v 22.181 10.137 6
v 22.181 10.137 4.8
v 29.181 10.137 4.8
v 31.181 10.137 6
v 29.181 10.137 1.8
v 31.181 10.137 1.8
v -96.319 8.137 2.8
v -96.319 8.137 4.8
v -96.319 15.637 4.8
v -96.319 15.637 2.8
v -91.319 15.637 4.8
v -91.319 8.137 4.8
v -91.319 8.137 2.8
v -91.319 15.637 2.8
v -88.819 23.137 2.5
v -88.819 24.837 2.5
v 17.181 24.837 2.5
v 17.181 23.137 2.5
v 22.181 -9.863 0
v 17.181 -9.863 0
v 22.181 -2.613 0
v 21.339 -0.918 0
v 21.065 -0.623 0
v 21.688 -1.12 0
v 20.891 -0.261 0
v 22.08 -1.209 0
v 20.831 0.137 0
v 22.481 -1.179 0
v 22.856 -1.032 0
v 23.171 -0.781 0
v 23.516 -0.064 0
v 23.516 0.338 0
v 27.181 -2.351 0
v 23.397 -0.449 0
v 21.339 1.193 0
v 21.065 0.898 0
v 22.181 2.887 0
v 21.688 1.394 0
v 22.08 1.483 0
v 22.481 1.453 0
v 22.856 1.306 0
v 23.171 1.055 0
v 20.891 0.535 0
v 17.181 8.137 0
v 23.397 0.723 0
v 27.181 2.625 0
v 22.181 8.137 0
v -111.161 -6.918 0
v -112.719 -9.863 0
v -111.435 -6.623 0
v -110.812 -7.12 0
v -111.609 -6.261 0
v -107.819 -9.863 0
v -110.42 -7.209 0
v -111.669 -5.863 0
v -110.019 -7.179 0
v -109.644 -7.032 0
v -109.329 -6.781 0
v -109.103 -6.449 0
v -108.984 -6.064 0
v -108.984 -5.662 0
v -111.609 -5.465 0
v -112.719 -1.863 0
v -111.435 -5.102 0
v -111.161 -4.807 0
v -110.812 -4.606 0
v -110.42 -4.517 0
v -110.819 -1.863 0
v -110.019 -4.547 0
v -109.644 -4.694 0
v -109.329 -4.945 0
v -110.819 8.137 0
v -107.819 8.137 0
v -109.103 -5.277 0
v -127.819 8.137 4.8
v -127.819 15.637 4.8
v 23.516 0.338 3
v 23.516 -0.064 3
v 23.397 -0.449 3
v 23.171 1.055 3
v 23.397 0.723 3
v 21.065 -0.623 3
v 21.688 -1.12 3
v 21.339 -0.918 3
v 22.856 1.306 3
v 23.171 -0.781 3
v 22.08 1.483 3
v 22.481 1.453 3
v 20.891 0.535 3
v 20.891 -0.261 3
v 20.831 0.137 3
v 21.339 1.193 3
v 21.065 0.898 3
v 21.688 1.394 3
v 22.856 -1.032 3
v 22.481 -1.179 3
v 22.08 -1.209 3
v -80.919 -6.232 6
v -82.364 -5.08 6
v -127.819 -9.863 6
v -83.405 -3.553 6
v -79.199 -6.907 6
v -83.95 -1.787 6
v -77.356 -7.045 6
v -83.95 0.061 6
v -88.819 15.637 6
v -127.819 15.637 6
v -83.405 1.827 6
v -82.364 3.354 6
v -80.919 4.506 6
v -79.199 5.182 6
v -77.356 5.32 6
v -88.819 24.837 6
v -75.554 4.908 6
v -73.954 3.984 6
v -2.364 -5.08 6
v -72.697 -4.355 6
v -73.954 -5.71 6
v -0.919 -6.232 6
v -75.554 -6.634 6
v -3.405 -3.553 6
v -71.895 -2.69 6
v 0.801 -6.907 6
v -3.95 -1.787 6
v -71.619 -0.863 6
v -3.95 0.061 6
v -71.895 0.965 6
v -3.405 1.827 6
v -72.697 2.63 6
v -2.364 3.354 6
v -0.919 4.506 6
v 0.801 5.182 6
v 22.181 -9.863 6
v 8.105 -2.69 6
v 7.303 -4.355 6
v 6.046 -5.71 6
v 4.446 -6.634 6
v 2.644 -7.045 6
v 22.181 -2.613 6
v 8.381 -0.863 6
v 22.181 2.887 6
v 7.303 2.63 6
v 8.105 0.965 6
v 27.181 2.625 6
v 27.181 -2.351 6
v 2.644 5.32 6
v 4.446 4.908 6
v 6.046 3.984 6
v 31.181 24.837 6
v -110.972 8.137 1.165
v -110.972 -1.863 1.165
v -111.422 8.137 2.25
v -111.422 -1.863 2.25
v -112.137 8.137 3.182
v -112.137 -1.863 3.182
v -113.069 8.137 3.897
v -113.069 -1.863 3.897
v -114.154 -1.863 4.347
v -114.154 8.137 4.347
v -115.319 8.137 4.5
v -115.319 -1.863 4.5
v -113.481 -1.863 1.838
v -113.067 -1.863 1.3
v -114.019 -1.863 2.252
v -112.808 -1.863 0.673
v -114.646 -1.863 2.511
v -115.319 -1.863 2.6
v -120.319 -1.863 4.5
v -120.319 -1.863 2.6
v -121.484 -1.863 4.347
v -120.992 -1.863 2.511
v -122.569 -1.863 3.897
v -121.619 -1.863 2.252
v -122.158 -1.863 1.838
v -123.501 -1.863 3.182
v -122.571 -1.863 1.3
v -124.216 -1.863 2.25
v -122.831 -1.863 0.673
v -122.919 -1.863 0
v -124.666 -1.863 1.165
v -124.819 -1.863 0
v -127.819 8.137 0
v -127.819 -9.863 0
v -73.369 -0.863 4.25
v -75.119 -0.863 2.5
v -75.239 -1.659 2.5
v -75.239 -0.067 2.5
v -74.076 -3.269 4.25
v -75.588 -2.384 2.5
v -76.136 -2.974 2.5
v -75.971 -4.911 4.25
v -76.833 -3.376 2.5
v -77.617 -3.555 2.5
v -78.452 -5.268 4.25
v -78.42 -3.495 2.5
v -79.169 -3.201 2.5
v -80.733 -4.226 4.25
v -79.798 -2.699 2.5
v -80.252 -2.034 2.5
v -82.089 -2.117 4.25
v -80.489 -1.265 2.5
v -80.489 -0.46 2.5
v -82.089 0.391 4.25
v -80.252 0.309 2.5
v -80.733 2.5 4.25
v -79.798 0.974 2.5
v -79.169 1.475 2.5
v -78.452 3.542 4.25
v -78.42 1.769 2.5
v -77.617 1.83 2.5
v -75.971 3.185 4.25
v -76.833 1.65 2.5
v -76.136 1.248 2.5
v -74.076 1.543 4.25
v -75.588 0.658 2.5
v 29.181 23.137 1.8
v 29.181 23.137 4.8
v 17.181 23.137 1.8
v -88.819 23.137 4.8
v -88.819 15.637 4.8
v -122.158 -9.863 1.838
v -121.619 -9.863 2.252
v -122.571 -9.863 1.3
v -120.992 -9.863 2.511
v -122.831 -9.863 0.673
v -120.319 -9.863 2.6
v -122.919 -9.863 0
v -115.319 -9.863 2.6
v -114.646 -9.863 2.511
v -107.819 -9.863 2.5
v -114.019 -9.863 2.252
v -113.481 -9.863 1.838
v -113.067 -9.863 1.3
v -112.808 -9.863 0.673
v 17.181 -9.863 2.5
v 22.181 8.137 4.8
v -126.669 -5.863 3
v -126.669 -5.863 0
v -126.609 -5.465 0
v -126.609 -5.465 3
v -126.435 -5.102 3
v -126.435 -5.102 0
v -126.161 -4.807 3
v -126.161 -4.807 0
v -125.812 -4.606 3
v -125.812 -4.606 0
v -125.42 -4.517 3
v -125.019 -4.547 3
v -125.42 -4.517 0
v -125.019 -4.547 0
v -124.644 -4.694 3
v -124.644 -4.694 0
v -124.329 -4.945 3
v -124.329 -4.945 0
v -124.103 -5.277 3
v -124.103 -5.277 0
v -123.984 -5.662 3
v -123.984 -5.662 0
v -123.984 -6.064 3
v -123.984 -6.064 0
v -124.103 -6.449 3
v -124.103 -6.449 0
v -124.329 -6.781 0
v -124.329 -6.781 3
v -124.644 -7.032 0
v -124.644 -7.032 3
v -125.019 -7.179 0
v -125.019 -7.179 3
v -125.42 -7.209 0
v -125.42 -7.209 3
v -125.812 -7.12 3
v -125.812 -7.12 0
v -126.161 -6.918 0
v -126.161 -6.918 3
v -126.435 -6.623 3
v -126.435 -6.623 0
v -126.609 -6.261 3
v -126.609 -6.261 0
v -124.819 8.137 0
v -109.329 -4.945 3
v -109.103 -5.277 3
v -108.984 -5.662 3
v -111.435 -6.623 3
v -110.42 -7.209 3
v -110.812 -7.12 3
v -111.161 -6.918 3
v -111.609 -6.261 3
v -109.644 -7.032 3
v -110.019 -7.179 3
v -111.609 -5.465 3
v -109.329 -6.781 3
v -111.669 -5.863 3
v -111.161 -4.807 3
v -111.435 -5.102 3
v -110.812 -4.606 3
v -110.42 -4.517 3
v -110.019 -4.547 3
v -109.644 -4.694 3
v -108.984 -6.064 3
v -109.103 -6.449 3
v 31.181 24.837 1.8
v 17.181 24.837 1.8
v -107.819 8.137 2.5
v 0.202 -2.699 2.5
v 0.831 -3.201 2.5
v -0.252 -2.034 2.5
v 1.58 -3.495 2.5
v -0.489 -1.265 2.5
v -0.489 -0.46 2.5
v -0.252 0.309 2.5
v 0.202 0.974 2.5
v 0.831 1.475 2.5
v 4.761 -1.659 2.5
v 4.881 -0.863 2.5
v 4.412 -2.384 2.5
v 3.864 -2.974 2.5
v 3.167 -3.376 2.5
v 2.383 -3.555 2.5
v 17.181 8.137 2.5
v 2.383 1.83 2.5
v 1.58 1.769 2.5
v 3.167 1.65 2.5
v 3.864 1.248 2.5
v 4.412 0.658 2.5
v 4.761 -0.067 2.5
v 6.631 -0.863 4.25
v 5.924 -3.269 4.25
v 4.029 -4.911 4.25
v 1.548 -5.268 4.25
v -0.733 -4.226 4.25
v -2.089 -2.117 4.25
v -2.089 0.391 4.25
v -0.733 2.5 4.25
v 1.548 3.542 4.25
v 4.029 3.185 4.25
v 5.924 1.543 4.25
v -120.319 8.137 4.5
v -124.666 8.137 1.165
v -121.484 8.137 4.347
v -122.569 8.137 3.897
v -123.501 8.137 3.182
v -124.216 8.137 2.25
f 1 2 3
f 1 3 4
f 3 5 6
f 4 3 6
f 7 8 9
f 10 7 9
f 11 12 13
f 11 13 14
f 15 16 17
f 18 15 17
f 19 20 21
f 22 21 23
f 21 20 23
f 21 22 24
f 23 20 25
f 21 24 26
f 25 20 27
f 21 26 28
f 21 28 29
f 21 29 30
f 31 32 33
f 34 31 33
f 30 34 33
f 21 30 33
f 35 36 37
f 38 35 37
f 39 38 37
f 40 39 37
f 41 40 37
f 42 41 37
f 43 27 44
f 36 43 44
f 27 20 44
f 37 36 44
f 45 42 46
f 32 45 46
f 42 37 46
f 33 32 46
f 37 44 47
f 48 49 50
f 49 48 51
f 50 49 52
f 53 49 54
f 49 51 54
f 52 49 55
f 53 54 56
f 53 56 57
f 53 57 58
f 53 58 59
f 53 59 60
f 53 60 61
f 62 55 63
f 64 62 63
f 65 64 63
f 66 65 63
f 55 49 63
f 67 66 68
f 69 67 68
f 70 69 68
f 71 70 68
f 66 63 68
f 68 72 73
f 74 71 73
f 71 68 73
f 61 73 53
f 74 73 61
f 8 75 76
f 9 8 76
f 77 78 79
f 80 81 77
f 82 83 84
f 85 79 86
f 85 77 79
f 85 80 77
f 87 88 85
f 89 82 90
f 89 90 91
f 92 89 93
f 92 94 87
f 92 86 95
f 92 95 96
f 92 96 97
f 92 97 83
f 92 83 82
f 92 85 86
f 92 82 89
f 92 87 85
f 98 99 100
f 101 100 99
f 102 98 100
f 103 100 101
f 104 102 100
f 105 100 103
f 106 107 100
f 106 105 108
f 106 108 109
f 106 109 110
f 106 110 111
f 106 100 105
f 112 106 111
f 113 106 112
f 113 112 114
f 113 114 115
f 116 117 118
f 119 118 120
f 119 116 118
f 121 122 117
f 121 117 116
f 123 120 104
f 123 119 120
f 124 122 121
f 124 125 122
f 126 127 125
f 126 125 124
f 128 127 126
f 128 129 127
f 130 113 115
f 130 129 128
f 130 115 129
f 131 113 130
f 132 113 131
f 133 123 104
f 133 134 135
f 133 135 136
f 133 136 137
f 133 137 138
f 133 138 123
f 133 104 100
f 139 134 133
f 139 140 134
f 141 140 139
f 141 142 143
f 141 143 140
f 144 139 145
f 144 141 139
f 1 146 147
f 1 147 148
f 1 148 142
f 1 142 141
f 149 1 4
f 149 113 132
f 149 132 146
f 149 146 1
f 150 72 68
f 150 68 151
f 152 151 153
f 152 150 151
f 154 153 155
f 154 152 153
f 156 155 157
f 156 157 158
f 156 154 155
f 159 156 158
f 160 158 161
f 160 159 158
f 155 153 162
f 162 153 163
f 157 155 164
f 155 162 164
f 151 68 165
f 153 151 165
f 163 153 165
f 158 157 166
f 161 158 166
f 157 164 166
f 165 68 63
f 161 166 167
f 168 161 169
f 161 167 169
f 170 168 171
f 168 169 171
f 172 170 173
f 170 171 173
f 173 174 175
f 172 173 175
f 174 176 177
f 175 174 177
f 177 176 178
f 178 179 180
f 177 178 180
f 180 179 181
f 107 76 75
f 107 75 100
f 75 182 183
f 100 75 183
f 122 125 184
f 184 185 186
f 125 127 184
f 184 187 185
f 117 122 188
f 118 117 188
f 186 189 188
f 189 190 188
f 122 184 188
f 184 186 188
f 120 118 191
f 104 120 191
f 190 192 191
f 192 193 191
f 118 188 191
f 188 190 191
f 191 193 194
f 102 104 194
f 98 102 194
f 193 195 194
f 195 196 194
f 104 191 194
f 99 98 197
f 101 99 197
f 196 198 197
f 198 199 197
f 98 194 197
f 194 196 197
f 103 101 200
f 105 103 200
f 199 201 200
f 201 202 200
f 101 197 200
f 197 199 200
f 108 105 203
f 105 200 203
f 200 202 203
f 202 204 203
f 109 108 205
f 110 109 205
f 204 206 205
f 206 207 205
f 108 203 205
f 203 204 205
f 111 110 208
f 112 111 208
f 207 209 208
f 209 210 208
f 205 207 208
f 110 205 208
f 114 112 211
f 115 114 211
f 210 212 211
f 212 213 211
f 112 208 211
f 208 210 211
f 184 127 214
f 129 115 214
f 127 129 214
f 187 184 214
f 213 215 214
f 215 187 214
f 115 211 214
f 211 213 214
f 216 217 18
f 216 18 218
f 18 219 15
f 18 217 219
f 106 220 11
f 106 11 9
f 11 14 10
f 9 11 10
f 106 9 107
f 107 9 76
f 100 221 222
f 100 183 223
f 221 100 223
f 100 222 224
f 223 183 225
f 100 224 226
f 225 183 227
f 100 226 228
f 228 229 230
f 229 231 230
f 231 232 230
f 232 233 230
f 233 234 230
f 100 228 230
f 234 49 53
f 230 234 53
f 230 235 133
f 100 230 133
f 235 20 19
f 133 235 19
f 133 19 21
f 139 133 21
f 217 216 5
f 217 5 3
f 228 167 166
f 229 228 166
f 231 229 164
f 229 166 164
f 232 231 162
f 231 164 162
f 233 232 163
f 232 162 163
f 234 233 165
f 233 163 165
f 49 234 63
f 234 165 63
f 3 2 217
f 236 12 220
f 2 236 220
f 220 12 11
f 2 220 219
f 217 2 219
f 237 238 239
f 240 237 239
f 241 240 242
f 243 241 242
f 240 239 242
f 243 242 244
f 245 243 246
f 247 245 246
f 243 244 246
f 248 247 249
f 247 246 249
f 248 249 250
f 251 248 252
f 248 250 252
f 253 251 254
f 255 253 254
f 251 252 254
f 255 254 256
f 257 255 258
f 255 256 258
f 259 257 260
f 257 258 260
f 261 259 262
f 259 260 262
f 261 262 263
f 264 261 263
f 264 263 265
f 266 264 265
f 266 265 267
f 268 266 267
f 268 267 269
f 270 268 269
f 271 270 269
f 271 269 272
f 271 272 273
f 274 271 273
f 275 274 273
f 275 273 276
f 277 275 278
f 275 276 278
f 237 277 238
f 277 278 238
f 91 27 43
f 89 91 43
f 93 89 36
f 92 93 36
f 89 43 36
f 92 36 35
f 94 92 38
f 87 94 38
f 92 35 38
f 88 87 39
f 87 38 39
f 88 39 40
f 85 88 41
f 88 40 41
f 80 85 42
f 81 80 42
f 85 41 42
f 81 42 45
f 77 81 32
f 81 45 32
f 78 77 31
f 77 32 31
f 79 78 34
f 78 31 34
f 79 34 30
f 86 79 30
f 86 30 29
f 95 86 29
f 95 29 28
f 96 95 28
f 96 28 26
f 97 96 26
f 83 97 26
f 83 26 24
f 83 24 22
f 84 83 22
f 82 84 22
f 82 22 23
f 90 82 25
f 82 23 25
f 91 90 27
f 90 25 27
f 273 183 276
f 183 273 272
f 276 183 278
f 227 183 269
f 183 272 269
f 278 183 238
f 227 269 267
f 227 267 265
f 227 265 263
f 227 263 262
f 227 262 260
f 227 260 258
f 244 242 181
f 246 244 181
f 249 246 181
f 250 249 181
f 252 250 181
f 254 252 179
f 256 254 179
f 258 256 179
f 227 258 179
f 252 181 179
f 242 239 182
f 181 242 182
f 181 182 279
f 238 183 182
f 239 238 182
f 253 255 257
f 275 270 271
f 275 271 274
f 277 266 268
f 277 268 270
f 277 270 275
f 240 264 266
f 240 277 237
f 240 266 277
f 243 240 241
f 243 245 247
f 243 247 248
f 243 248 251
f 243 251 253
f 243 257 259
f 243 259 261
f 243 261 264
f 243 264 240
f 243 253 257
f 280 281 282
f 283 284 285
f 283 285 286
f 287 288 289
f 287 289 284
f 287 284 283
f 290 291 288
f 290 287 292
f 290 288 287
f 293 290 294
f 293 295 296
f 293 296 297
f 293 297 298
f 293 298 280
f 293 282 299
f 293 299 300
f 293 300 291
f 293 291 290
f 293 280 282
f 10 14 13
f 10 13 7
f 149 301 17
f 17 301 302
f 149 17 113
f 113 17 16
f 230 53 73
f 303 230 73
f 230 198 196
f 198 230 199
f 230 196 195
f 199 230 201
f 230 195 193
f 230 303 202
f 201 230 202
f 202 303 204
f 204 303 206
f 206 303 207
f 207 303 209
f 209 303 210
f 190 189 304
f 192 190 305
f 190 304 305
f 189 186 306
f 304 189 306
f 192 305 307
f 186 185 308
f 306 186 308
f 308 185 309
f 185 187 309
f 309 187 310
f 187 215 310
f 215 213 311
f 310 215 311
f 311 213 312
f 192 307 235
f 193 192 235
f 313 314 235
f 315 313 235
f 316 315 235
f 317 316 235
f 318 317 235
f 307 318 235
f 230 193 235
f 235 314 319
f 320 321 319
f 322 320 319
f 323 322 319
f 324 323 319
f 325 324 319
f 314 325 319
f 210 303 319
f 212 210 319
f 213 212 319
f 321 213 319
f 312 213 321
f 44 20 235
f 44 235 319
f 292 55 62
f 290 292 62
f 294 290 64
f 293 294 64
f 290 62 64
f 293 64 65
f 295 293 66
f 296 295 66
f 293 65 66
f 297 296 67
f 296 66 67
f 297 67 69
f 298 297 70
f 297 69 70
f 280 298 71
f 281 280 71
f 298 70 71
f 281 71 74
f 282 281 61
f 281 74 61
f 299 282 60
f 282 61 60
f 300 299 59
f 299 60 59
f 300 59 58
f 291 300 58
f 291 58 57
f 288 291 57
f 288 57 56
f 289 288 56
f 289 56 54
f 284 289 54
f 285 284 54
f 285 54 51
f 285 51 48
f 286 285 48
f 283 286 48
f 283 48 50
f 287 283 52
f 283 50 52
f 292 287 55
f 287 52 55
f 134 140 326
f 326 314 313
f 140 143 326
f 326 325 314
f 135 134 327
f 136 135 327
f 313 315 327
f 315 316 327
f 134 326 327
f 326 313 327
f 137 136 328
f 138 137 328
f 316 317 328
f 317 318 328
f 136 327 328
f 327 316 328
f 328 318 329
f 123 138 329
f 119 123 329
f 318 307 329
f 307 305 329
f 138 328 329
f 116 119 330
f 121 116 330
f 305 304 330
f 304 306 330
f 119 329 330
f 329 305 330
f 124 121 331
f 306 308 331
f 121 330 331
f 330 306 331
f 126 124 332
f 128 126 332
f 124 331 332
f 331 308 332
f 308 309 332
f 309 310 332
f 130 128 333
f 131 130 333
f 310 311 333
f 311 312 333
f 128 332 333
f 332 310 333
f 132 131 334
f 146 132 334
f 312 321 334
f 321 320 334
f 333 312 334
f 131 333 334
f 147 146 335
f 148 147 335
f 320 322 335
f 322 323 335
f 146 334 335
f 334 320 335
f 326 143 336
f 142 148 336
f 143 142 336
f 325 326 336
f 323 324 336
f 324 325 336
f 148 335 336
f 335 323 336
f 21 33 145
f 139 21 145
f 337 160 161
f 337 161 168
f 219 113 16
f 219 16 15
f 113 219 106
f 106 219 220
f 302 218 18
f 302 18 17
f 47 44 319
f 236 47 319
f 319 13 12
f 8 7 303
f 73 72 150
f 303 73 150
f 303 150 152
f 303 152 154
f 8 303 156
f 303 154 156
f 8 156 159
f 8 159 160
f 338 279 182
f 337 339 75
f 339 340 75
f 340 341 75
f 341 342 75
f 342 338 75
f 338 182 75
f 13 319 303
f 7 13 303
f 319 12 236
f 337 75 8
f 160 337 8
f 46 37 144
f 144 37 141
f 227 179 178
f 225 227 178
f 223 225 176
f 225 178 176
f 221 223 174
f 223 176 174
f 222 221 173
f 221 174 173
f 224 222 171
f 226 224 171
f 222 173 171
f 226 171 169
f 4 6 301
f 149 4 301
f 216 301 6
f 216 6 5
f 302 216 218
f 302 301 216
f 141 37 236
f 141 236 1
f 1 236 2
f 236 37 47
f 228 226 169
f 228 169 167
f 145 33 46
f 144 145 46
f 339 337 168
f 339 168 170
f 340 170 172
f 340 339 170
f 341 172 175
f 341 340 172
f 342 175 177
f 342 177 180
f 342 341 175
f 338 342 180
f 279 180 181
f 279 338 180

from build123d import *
from OCP.BRepFilletAPI import BRepFilletAPI_MakeChamfer

# Parameters (mm, degrees)
BOSS_EXTRUDE1_DEPTH      = 6
BOSS_EXTRUDE1_DEPTH_BACK = 6
CUT_EXTRUDE1_DEPTH       = 157
CUT_EXTRUDE4_DEPTH       = 2.5
CUT_EXTRUDE4_DEPTH_BACK  = 2.5
SKETCH8_W                = 125
SKETCH8_H                = 34.7
CUT_EXTRUDE5_DEPTH       = 131.348014108
CUT_EXTRUDE5_DEPTH_BACK  = 131.348014108
SKETCH9_R                = 2.7
CHAMFER2_SIZE            = 5
CHAMFER2_SIZE_2          = 0.262038896
CUT_EXTRUDE8_DEPTH       = 10
CUT_EXTRUDE9_DEPTH       = 131.715773363
SKETCH16_W               = 214.344642296
SKETCH16_H               = 84.645654919
CUT_EXTRUDE10_DEPTH      = 131.348014108
SKETCH17_W               = 2
SKETCH17_H               = 14.7
CUT_EXTRUDE11_DEPTH      = 1.8
SKETCH18_R               = 1.35
CUT_EXTRUDE12_DEPTH      = 3
CHAMFER7_SIZE            = 3.5
SKETCH19_W               = 5
SKETCH19_H               = 7.5
BOSS_EXTRUDE2_DEPTH      = 2


with BuildPart() as part:
    # Sketch1 → Boss-Extrude1 (new, two sides: drawn at the far end of the back side and taken through both)
    with BuildSketch(Plane.XY.offset(-BOSS_EXTRUDE1_DEPTH_BACK)):
        Polygon((-127.819104229, -9.862903226), (22.180895771, -9.862903226), (22.180895771, -2.612903226), (27.180895771, -2.612903226), (27.180895771, 2.887096774), (22.180895771, 2.887096774), (22.180895771, 10.137096774), (31.180895771, 10.137096774), (31.180895771, 23.637096774), (31.180895771, 24.837096774), (-88.819104229, 24.837096774), (-88.819104229, 23.637096774), (-88.819104229, 15.637096774), (-127.819104229, 15.637096774), align=None)
    extrude(amount=BOSS_EXTRUDE1_DEPTH + BOSS_EXTRUDE1_DEPTH_BACK)

    # Sketch2 → Cut-Extrude1 (cut)
    with BuildSketch(Plane.ZY.offset(127.819104229)):
        Polygon((-4.8, 23.137096774), (-4.8, 8.137096774), (4.8, 8.137096774), (4.8, 23.137096774), (1.8, 23.137096774), (1.8, 24.837096774), (-1.8, 24.837096774), (-1.8, 23.137096774), align=None)
    extrude(amount=-CUT_EXTRUDE1_DEPTH, mode=Mode.SUBTRACT)

    # Sketch8 → Cut-Extrude4 (cut, two sides: drawn at the far end of the back side and taken through both)
    with BuildSketch(Plane.XY.offset(-CUT_EXTRUDE4_DEPTH_BACK)):
        with Locations((-45.319104229, 7.487096774)):
            Rectangle(SKETCH8_W, SKETCH8_H)
    extrude(amount=CUT_EXTRUDE4_DEPTH + CUT_EXTRUDE4_DEPTH_BACK, mode=Mode.SUBTRACT)

    # Sketch9 → Cut-Extrude5 (cut, two sides: drawn at the far end of the back side and taken through both)
    with BuildSketch(Plane.XY.offset(-CUT_EXTRUDE5_DEPTH_BACK)):
        with Locations((-77.819104229, -0.862903226)):
            Circle(SKETCH9_R)
        with Locations((2.180895771, -0.862903226)):
            Circle(SKETCH9_R)
    extrude(amount=CUT_EXTRUDE5_DEPTH + CUT_EXTRUDE5_DEPTH_BACK, mode=Mode.SUBTRACT)

    # Chamfer2
    chamfer2_edges_1 = [part.edges().sort_by_distance(p)[0] for p in [
        (27.180895771, -2.612903226, 0),
    ]]
    chamfer2_side_1 = [part.faces().sort_by_distance(p)[0] for p in [
        (27.175654993, -2.612903226, 0),
    ]]
    chamfer2_edges_2 = [part.edges().sort_by_distance(p)[0] for p in [
        (27.180895771, 2.887096774, 0),
    ]]
    chamfer2_side_2 = [part.faces().sort_by_distance(p)[0] for p in [
        (27.180895771, 2.881855996, 0),
    ]]
    chamfer2 = BRepFilletAPI_MakeChamfer(part.part.solid().wrapped)
    for e in chamfer2_edges_1:
        chamfer2.Add(CHAMFER2_SIZE - 0.0001, CHAMFER2_SIZE_2 - 0.0001, e.wrapped, chamfer2_side_1[0].wrapped)
    for e in chamfer2_edges_2:
        chamfer2.Add(CHAMFER2_SIZE_2 - 0.0001, CHAMFER2_SIZE - 0.0001, e.wrapped, chamfer2_side_2[0].wrapped)
    add(Compound.cast(chamfer2.Shape()), mode=Mode.REPLACE)  # a hair under: the kernel refuses the full size

    # Sketch14 → Cut-Extrude8 (cut)
    with BuildSketch(Plane(origin=(0, 8.137096774, 0), x_dir=(1, 0, 0), z_dir=(0, 1, 0))):
        with BuildLine():
            Line((-120.319104229, 4.5), (-115.319104229, 4.5))
            ThreePointArc((-115.319104229, 4.5), (-110.819104229, 0), (-115.319104229, -4.5))
            Line((-115.319104229, -4.5), (-120.319104229, -4.5))
            ThreePointArc((-120.319104229, -4.5), (-124.819104229, 0), (-120.319104229, 4.5))
        make_face()
    extrude(amount=-CUT_EXTRUDE8_DEPTH, mode=Mode.SUBTRACT)

    # Sketch15 → Cut-Extrude9 (cut, through all)
    with BuildSketch(Plane(origin=(0, -1.862903226, 0), x_dir=(1, 0, 0), z_dir=(0, 1, 0))):
        with BuildLine():
            Line((-120.319104229, -2.6), (-115.319104229, -2.6))
            ThreePointArc((-115.319104229, -2.6), (-112.719104229, 0), (-115.319104229, 2.6))
            Line((-115.319104229, 2.6), (-120.319104229, 2.6))
            ThreePointArc((-120.319104229, 2.6), (-122.919104229, 0), (-120.319104229, -2.6))
        make_face()
    extrude(amount=-CUT_EXTRUDE9_DEPTH, mode=Mode.SUBTRACT)

    # Sketch16 → Cut-Extrude10 (cut, through all)
    with BuildSketch(Plane.XY):
        with Locations((-30.272765953, 16.776086779)):
            Rectangle(SKETCH16_W, SKETCH16_H)
    extrude(amount=-CUT_EXTRUDE10_DEPTH, mode=Mode.SUBTRACT)

    # Sketch17 → Cut-Extrude11 (cut)
    with BuildSketch(Plane(origin=(0, 0, 0), x_dir=(-1, 0, 0), z_dir=(0, 0, -1))):
        with Locations((-30.180895771, 17.487096774)):
            Rectangle(SKETCH17_W, SKETCH17_H)
    extrude(amount=-CUT_EXTRUDE11_DEPTH, mode=Mode.SUBTRACT)

    # Sketch18 → Cut-Extrude12 (cut)
    with BuildSketch(Plane(origin=(0, 0, 0), x_dir=(-1, 0, 0), z_dir=(0, 0, -1))):
        with Locations((110.319104229, -5.862903226)):
            Circle(SKETCH18_R)
        with Locations((125.319104229, -5.862903226)):
            Circle(SKETCH18_R)
        with Locations((-22.180895771, 0.137096774)):
            Circle(SKETCH18_R)
    extrude(amount=-CUT_EXTRUDE12_DEPTH, mode=Mode.SUBTRACT)

    # Chamfer7
    chamfer7_edges = [part.edges().sort_by_distance(p)[0] for p in [
        (-80.519104229, -0.862903226, 6),
        (-0.519104229, -0.862903226, 6),
    ]]
    chamfer(chamfer7_edges, length=CHAMFER7_SIZE - 0.0001)  # a hair under: the kernel refuses the full size

    # Sketch19 → Boss-Extrude2 (add)
    with BuildSketch(Plane(origin=(0, 0, 4.8), x_dir=(-1, 0, 0), z_dir=(0, 0, -1))):
        with Locations((93.819104229, 11.887096774)):
            Rectangle(SKETCH19_W, SKETCH19_H)
    extrude(amount=BOSS_EXTRUDE2_DEPTH)


solid = part.part
